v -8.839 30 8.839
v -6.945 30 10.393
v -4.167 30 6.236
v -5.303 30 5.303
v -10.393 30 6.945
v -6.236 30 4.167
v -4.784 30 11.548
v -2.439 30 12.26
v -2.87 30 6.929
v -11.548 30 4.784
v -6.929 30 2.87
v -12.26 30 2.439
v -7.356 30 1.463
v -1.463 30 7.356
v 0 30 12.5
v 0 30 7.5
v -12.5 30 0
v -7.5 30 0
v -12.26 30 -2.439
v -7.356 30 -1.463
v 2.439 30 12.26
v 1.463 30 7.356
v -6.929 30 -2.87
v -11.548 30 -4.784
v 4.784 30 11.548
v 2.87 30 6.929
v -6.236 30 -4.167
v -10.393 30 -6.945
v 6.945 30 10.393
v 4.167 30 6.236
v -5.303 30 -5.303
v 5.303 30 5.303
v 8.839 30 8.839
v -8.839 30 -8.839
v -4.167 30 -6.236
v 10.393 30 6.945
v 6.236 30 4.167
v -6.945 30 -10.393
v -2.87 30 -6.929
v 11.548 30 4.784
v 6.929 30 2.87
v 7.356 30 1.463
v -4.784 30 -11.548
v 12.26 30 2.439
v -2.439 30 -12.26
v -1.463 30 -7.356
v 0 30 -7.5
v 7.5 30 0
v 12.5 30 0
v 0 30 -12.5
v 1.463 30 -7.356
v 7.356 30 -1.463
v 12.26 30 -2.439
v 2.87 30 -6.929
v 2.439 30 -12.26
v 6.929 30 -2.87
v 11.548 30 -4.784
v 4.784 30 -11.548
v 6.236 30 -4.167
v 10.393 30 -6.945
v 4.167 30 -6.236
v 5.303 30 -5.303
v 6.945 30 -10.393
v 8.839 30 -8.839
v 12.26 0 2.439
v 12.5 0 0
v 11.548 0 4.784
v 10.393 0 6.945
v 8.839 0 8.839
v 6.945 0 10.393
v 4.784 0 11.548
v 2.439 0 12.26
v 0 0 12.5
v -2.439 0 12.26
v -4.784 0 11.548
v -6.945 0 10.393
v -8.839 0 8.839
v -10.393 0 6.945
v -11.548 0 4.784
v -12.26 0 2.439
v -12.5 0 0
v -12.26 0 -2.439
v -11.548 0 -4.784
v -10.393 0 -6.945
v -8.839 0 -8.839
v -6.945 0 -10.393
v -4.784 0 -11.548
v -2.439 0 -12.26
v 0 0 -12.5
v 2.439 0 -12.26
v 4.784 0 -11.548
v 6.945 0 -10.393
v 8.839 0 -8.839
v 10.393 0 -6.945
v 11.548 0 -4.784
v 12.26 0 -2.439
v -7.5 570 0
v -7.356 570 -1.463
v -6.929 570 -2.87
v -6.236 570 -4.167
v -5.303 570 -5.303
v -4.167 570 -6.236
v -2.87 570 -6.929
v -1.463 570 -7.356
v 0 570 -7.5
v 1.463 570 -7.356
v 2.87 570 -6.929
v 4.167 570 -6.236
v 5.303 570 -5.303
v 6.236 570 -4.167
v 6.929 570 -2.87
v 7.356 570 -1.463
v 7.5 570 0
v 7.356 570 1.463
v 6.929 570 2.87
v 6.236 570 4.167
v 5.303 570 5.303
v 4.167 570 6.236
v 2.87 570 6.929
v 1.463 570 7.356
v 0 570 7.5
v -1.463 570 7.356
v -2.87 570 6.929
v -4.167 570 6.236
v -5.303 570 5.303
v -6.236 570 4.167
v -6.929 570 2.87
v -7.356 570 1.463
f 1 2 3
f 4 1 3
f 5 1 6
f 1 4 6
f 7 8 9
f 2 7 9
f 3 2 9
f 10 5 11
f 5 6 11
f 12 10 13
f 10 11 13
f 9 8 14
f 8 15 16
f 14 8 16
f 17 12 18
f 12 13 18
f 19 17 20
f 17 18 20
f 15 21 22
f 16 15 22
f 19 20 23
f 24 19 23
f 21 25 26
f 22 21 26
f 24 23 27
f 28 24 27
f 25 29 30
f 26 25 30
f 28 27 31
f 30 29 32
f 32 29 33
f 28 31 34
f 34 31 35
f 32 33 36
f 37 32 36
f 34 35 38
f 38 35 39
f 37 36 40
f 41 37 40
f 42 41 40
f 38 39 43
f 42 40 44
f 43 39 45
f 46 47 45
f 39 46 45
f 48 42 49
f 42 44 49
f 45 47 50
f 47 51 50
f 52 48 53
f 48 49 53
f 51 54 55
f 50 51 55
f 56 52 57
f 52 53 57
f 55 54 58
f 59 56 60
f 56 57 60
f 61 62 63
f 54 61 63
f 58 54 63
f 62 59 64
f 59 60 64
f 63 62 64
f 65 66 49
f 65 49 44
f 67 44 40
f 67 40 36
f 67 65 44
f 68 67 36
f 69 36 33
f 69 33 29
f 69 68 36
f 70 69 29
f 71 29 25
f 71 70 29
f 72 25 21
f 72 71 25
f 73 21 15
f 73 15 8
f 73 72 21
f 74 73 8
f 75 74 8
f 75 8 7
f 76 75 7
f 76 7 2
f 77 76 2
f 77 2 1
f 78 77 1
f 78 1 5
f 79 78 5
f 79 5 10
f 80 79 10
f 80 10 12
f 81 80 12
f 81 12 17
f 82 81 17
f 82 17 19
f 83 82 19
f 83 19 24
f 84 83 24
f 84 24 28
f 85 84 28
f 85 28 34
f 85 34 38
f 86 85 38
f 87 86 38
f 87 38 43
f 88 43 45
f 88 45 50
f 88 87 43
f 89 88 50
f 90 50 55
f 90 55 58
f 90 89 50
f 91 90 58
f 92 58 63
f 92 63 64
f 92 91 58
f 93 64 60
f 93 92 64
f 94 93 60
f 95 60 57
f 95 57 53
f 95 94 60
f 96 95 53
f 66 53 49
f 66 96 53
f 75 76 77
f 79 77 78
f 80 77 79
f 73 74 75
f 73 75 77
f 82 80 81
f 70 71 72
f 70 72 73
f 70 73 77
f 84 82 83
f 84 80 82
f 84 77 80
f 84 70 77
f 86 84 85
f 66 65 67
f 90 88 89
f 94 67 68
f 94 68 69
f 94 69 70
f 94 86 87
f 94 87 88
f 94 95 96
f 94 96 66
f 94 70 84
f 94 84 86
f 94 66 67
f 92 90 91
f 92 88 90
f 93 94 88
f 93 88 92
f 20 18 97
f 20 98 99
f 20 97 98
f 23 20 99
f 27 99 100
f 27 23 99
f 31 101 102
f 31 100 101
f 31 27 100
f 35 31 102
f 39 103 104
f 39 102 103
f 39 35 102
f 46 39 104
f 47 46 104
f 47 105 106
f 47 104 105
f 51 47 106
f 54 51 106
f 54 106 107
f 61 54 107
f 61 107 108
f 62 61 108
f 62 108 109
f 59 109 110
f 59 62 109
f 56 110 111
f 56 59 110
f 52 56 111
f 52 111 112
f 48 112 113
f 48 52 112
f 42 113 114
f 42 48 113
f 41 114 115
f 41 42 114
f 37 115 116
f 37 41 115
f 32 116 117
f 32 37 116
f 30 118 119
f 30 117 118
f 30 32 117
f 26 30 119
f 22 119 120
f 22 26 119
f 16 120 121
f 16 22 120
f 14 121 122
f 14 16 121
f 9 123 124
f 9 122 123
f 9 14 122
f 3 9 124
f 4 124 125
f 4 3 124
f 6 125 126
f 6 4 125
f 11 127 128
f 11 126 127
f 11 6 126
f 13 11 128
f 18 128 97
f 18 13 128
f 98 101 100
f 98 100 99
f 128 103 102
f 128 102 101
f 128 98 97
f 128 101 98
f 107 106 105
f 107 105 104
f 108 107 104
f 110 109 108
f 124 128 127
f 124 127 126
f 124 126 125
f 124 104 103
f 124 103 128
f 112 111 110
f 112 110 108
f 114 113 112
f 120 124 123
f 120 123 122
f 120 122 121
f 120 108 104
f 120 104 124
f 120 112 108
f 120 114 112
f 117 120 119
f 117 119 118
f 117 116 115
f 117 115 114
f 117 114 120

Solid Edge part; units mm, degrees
sketch "Sketch1" plane through (0, 0, 0) normal (0, -1, 0) x (1, 0, 0)
  circle A0 centre (0, 0) radius 12.5
extrude "Protrusion1" add sketch "Sketch1" against normal blind 30
sketch "Sketch2" plane through (0, 30, 0) normal (0, 1, 0) x (-1, 0, 0)
  circle A0 centre (0, 0) radius 7.5
extrude "ExtrudedProtrusion_2" add sketch "Sketch2" along normal blind 30
sketch "Sketch3" plane through (0, 60, 0) normal (0, 1, 0) x (-1, 0, 0)
  circle A0 centre (0, 0) radius 7.5
extrude "ExtrudedProtrusion_3" add sketch "Sketch3" along normal blind 510
